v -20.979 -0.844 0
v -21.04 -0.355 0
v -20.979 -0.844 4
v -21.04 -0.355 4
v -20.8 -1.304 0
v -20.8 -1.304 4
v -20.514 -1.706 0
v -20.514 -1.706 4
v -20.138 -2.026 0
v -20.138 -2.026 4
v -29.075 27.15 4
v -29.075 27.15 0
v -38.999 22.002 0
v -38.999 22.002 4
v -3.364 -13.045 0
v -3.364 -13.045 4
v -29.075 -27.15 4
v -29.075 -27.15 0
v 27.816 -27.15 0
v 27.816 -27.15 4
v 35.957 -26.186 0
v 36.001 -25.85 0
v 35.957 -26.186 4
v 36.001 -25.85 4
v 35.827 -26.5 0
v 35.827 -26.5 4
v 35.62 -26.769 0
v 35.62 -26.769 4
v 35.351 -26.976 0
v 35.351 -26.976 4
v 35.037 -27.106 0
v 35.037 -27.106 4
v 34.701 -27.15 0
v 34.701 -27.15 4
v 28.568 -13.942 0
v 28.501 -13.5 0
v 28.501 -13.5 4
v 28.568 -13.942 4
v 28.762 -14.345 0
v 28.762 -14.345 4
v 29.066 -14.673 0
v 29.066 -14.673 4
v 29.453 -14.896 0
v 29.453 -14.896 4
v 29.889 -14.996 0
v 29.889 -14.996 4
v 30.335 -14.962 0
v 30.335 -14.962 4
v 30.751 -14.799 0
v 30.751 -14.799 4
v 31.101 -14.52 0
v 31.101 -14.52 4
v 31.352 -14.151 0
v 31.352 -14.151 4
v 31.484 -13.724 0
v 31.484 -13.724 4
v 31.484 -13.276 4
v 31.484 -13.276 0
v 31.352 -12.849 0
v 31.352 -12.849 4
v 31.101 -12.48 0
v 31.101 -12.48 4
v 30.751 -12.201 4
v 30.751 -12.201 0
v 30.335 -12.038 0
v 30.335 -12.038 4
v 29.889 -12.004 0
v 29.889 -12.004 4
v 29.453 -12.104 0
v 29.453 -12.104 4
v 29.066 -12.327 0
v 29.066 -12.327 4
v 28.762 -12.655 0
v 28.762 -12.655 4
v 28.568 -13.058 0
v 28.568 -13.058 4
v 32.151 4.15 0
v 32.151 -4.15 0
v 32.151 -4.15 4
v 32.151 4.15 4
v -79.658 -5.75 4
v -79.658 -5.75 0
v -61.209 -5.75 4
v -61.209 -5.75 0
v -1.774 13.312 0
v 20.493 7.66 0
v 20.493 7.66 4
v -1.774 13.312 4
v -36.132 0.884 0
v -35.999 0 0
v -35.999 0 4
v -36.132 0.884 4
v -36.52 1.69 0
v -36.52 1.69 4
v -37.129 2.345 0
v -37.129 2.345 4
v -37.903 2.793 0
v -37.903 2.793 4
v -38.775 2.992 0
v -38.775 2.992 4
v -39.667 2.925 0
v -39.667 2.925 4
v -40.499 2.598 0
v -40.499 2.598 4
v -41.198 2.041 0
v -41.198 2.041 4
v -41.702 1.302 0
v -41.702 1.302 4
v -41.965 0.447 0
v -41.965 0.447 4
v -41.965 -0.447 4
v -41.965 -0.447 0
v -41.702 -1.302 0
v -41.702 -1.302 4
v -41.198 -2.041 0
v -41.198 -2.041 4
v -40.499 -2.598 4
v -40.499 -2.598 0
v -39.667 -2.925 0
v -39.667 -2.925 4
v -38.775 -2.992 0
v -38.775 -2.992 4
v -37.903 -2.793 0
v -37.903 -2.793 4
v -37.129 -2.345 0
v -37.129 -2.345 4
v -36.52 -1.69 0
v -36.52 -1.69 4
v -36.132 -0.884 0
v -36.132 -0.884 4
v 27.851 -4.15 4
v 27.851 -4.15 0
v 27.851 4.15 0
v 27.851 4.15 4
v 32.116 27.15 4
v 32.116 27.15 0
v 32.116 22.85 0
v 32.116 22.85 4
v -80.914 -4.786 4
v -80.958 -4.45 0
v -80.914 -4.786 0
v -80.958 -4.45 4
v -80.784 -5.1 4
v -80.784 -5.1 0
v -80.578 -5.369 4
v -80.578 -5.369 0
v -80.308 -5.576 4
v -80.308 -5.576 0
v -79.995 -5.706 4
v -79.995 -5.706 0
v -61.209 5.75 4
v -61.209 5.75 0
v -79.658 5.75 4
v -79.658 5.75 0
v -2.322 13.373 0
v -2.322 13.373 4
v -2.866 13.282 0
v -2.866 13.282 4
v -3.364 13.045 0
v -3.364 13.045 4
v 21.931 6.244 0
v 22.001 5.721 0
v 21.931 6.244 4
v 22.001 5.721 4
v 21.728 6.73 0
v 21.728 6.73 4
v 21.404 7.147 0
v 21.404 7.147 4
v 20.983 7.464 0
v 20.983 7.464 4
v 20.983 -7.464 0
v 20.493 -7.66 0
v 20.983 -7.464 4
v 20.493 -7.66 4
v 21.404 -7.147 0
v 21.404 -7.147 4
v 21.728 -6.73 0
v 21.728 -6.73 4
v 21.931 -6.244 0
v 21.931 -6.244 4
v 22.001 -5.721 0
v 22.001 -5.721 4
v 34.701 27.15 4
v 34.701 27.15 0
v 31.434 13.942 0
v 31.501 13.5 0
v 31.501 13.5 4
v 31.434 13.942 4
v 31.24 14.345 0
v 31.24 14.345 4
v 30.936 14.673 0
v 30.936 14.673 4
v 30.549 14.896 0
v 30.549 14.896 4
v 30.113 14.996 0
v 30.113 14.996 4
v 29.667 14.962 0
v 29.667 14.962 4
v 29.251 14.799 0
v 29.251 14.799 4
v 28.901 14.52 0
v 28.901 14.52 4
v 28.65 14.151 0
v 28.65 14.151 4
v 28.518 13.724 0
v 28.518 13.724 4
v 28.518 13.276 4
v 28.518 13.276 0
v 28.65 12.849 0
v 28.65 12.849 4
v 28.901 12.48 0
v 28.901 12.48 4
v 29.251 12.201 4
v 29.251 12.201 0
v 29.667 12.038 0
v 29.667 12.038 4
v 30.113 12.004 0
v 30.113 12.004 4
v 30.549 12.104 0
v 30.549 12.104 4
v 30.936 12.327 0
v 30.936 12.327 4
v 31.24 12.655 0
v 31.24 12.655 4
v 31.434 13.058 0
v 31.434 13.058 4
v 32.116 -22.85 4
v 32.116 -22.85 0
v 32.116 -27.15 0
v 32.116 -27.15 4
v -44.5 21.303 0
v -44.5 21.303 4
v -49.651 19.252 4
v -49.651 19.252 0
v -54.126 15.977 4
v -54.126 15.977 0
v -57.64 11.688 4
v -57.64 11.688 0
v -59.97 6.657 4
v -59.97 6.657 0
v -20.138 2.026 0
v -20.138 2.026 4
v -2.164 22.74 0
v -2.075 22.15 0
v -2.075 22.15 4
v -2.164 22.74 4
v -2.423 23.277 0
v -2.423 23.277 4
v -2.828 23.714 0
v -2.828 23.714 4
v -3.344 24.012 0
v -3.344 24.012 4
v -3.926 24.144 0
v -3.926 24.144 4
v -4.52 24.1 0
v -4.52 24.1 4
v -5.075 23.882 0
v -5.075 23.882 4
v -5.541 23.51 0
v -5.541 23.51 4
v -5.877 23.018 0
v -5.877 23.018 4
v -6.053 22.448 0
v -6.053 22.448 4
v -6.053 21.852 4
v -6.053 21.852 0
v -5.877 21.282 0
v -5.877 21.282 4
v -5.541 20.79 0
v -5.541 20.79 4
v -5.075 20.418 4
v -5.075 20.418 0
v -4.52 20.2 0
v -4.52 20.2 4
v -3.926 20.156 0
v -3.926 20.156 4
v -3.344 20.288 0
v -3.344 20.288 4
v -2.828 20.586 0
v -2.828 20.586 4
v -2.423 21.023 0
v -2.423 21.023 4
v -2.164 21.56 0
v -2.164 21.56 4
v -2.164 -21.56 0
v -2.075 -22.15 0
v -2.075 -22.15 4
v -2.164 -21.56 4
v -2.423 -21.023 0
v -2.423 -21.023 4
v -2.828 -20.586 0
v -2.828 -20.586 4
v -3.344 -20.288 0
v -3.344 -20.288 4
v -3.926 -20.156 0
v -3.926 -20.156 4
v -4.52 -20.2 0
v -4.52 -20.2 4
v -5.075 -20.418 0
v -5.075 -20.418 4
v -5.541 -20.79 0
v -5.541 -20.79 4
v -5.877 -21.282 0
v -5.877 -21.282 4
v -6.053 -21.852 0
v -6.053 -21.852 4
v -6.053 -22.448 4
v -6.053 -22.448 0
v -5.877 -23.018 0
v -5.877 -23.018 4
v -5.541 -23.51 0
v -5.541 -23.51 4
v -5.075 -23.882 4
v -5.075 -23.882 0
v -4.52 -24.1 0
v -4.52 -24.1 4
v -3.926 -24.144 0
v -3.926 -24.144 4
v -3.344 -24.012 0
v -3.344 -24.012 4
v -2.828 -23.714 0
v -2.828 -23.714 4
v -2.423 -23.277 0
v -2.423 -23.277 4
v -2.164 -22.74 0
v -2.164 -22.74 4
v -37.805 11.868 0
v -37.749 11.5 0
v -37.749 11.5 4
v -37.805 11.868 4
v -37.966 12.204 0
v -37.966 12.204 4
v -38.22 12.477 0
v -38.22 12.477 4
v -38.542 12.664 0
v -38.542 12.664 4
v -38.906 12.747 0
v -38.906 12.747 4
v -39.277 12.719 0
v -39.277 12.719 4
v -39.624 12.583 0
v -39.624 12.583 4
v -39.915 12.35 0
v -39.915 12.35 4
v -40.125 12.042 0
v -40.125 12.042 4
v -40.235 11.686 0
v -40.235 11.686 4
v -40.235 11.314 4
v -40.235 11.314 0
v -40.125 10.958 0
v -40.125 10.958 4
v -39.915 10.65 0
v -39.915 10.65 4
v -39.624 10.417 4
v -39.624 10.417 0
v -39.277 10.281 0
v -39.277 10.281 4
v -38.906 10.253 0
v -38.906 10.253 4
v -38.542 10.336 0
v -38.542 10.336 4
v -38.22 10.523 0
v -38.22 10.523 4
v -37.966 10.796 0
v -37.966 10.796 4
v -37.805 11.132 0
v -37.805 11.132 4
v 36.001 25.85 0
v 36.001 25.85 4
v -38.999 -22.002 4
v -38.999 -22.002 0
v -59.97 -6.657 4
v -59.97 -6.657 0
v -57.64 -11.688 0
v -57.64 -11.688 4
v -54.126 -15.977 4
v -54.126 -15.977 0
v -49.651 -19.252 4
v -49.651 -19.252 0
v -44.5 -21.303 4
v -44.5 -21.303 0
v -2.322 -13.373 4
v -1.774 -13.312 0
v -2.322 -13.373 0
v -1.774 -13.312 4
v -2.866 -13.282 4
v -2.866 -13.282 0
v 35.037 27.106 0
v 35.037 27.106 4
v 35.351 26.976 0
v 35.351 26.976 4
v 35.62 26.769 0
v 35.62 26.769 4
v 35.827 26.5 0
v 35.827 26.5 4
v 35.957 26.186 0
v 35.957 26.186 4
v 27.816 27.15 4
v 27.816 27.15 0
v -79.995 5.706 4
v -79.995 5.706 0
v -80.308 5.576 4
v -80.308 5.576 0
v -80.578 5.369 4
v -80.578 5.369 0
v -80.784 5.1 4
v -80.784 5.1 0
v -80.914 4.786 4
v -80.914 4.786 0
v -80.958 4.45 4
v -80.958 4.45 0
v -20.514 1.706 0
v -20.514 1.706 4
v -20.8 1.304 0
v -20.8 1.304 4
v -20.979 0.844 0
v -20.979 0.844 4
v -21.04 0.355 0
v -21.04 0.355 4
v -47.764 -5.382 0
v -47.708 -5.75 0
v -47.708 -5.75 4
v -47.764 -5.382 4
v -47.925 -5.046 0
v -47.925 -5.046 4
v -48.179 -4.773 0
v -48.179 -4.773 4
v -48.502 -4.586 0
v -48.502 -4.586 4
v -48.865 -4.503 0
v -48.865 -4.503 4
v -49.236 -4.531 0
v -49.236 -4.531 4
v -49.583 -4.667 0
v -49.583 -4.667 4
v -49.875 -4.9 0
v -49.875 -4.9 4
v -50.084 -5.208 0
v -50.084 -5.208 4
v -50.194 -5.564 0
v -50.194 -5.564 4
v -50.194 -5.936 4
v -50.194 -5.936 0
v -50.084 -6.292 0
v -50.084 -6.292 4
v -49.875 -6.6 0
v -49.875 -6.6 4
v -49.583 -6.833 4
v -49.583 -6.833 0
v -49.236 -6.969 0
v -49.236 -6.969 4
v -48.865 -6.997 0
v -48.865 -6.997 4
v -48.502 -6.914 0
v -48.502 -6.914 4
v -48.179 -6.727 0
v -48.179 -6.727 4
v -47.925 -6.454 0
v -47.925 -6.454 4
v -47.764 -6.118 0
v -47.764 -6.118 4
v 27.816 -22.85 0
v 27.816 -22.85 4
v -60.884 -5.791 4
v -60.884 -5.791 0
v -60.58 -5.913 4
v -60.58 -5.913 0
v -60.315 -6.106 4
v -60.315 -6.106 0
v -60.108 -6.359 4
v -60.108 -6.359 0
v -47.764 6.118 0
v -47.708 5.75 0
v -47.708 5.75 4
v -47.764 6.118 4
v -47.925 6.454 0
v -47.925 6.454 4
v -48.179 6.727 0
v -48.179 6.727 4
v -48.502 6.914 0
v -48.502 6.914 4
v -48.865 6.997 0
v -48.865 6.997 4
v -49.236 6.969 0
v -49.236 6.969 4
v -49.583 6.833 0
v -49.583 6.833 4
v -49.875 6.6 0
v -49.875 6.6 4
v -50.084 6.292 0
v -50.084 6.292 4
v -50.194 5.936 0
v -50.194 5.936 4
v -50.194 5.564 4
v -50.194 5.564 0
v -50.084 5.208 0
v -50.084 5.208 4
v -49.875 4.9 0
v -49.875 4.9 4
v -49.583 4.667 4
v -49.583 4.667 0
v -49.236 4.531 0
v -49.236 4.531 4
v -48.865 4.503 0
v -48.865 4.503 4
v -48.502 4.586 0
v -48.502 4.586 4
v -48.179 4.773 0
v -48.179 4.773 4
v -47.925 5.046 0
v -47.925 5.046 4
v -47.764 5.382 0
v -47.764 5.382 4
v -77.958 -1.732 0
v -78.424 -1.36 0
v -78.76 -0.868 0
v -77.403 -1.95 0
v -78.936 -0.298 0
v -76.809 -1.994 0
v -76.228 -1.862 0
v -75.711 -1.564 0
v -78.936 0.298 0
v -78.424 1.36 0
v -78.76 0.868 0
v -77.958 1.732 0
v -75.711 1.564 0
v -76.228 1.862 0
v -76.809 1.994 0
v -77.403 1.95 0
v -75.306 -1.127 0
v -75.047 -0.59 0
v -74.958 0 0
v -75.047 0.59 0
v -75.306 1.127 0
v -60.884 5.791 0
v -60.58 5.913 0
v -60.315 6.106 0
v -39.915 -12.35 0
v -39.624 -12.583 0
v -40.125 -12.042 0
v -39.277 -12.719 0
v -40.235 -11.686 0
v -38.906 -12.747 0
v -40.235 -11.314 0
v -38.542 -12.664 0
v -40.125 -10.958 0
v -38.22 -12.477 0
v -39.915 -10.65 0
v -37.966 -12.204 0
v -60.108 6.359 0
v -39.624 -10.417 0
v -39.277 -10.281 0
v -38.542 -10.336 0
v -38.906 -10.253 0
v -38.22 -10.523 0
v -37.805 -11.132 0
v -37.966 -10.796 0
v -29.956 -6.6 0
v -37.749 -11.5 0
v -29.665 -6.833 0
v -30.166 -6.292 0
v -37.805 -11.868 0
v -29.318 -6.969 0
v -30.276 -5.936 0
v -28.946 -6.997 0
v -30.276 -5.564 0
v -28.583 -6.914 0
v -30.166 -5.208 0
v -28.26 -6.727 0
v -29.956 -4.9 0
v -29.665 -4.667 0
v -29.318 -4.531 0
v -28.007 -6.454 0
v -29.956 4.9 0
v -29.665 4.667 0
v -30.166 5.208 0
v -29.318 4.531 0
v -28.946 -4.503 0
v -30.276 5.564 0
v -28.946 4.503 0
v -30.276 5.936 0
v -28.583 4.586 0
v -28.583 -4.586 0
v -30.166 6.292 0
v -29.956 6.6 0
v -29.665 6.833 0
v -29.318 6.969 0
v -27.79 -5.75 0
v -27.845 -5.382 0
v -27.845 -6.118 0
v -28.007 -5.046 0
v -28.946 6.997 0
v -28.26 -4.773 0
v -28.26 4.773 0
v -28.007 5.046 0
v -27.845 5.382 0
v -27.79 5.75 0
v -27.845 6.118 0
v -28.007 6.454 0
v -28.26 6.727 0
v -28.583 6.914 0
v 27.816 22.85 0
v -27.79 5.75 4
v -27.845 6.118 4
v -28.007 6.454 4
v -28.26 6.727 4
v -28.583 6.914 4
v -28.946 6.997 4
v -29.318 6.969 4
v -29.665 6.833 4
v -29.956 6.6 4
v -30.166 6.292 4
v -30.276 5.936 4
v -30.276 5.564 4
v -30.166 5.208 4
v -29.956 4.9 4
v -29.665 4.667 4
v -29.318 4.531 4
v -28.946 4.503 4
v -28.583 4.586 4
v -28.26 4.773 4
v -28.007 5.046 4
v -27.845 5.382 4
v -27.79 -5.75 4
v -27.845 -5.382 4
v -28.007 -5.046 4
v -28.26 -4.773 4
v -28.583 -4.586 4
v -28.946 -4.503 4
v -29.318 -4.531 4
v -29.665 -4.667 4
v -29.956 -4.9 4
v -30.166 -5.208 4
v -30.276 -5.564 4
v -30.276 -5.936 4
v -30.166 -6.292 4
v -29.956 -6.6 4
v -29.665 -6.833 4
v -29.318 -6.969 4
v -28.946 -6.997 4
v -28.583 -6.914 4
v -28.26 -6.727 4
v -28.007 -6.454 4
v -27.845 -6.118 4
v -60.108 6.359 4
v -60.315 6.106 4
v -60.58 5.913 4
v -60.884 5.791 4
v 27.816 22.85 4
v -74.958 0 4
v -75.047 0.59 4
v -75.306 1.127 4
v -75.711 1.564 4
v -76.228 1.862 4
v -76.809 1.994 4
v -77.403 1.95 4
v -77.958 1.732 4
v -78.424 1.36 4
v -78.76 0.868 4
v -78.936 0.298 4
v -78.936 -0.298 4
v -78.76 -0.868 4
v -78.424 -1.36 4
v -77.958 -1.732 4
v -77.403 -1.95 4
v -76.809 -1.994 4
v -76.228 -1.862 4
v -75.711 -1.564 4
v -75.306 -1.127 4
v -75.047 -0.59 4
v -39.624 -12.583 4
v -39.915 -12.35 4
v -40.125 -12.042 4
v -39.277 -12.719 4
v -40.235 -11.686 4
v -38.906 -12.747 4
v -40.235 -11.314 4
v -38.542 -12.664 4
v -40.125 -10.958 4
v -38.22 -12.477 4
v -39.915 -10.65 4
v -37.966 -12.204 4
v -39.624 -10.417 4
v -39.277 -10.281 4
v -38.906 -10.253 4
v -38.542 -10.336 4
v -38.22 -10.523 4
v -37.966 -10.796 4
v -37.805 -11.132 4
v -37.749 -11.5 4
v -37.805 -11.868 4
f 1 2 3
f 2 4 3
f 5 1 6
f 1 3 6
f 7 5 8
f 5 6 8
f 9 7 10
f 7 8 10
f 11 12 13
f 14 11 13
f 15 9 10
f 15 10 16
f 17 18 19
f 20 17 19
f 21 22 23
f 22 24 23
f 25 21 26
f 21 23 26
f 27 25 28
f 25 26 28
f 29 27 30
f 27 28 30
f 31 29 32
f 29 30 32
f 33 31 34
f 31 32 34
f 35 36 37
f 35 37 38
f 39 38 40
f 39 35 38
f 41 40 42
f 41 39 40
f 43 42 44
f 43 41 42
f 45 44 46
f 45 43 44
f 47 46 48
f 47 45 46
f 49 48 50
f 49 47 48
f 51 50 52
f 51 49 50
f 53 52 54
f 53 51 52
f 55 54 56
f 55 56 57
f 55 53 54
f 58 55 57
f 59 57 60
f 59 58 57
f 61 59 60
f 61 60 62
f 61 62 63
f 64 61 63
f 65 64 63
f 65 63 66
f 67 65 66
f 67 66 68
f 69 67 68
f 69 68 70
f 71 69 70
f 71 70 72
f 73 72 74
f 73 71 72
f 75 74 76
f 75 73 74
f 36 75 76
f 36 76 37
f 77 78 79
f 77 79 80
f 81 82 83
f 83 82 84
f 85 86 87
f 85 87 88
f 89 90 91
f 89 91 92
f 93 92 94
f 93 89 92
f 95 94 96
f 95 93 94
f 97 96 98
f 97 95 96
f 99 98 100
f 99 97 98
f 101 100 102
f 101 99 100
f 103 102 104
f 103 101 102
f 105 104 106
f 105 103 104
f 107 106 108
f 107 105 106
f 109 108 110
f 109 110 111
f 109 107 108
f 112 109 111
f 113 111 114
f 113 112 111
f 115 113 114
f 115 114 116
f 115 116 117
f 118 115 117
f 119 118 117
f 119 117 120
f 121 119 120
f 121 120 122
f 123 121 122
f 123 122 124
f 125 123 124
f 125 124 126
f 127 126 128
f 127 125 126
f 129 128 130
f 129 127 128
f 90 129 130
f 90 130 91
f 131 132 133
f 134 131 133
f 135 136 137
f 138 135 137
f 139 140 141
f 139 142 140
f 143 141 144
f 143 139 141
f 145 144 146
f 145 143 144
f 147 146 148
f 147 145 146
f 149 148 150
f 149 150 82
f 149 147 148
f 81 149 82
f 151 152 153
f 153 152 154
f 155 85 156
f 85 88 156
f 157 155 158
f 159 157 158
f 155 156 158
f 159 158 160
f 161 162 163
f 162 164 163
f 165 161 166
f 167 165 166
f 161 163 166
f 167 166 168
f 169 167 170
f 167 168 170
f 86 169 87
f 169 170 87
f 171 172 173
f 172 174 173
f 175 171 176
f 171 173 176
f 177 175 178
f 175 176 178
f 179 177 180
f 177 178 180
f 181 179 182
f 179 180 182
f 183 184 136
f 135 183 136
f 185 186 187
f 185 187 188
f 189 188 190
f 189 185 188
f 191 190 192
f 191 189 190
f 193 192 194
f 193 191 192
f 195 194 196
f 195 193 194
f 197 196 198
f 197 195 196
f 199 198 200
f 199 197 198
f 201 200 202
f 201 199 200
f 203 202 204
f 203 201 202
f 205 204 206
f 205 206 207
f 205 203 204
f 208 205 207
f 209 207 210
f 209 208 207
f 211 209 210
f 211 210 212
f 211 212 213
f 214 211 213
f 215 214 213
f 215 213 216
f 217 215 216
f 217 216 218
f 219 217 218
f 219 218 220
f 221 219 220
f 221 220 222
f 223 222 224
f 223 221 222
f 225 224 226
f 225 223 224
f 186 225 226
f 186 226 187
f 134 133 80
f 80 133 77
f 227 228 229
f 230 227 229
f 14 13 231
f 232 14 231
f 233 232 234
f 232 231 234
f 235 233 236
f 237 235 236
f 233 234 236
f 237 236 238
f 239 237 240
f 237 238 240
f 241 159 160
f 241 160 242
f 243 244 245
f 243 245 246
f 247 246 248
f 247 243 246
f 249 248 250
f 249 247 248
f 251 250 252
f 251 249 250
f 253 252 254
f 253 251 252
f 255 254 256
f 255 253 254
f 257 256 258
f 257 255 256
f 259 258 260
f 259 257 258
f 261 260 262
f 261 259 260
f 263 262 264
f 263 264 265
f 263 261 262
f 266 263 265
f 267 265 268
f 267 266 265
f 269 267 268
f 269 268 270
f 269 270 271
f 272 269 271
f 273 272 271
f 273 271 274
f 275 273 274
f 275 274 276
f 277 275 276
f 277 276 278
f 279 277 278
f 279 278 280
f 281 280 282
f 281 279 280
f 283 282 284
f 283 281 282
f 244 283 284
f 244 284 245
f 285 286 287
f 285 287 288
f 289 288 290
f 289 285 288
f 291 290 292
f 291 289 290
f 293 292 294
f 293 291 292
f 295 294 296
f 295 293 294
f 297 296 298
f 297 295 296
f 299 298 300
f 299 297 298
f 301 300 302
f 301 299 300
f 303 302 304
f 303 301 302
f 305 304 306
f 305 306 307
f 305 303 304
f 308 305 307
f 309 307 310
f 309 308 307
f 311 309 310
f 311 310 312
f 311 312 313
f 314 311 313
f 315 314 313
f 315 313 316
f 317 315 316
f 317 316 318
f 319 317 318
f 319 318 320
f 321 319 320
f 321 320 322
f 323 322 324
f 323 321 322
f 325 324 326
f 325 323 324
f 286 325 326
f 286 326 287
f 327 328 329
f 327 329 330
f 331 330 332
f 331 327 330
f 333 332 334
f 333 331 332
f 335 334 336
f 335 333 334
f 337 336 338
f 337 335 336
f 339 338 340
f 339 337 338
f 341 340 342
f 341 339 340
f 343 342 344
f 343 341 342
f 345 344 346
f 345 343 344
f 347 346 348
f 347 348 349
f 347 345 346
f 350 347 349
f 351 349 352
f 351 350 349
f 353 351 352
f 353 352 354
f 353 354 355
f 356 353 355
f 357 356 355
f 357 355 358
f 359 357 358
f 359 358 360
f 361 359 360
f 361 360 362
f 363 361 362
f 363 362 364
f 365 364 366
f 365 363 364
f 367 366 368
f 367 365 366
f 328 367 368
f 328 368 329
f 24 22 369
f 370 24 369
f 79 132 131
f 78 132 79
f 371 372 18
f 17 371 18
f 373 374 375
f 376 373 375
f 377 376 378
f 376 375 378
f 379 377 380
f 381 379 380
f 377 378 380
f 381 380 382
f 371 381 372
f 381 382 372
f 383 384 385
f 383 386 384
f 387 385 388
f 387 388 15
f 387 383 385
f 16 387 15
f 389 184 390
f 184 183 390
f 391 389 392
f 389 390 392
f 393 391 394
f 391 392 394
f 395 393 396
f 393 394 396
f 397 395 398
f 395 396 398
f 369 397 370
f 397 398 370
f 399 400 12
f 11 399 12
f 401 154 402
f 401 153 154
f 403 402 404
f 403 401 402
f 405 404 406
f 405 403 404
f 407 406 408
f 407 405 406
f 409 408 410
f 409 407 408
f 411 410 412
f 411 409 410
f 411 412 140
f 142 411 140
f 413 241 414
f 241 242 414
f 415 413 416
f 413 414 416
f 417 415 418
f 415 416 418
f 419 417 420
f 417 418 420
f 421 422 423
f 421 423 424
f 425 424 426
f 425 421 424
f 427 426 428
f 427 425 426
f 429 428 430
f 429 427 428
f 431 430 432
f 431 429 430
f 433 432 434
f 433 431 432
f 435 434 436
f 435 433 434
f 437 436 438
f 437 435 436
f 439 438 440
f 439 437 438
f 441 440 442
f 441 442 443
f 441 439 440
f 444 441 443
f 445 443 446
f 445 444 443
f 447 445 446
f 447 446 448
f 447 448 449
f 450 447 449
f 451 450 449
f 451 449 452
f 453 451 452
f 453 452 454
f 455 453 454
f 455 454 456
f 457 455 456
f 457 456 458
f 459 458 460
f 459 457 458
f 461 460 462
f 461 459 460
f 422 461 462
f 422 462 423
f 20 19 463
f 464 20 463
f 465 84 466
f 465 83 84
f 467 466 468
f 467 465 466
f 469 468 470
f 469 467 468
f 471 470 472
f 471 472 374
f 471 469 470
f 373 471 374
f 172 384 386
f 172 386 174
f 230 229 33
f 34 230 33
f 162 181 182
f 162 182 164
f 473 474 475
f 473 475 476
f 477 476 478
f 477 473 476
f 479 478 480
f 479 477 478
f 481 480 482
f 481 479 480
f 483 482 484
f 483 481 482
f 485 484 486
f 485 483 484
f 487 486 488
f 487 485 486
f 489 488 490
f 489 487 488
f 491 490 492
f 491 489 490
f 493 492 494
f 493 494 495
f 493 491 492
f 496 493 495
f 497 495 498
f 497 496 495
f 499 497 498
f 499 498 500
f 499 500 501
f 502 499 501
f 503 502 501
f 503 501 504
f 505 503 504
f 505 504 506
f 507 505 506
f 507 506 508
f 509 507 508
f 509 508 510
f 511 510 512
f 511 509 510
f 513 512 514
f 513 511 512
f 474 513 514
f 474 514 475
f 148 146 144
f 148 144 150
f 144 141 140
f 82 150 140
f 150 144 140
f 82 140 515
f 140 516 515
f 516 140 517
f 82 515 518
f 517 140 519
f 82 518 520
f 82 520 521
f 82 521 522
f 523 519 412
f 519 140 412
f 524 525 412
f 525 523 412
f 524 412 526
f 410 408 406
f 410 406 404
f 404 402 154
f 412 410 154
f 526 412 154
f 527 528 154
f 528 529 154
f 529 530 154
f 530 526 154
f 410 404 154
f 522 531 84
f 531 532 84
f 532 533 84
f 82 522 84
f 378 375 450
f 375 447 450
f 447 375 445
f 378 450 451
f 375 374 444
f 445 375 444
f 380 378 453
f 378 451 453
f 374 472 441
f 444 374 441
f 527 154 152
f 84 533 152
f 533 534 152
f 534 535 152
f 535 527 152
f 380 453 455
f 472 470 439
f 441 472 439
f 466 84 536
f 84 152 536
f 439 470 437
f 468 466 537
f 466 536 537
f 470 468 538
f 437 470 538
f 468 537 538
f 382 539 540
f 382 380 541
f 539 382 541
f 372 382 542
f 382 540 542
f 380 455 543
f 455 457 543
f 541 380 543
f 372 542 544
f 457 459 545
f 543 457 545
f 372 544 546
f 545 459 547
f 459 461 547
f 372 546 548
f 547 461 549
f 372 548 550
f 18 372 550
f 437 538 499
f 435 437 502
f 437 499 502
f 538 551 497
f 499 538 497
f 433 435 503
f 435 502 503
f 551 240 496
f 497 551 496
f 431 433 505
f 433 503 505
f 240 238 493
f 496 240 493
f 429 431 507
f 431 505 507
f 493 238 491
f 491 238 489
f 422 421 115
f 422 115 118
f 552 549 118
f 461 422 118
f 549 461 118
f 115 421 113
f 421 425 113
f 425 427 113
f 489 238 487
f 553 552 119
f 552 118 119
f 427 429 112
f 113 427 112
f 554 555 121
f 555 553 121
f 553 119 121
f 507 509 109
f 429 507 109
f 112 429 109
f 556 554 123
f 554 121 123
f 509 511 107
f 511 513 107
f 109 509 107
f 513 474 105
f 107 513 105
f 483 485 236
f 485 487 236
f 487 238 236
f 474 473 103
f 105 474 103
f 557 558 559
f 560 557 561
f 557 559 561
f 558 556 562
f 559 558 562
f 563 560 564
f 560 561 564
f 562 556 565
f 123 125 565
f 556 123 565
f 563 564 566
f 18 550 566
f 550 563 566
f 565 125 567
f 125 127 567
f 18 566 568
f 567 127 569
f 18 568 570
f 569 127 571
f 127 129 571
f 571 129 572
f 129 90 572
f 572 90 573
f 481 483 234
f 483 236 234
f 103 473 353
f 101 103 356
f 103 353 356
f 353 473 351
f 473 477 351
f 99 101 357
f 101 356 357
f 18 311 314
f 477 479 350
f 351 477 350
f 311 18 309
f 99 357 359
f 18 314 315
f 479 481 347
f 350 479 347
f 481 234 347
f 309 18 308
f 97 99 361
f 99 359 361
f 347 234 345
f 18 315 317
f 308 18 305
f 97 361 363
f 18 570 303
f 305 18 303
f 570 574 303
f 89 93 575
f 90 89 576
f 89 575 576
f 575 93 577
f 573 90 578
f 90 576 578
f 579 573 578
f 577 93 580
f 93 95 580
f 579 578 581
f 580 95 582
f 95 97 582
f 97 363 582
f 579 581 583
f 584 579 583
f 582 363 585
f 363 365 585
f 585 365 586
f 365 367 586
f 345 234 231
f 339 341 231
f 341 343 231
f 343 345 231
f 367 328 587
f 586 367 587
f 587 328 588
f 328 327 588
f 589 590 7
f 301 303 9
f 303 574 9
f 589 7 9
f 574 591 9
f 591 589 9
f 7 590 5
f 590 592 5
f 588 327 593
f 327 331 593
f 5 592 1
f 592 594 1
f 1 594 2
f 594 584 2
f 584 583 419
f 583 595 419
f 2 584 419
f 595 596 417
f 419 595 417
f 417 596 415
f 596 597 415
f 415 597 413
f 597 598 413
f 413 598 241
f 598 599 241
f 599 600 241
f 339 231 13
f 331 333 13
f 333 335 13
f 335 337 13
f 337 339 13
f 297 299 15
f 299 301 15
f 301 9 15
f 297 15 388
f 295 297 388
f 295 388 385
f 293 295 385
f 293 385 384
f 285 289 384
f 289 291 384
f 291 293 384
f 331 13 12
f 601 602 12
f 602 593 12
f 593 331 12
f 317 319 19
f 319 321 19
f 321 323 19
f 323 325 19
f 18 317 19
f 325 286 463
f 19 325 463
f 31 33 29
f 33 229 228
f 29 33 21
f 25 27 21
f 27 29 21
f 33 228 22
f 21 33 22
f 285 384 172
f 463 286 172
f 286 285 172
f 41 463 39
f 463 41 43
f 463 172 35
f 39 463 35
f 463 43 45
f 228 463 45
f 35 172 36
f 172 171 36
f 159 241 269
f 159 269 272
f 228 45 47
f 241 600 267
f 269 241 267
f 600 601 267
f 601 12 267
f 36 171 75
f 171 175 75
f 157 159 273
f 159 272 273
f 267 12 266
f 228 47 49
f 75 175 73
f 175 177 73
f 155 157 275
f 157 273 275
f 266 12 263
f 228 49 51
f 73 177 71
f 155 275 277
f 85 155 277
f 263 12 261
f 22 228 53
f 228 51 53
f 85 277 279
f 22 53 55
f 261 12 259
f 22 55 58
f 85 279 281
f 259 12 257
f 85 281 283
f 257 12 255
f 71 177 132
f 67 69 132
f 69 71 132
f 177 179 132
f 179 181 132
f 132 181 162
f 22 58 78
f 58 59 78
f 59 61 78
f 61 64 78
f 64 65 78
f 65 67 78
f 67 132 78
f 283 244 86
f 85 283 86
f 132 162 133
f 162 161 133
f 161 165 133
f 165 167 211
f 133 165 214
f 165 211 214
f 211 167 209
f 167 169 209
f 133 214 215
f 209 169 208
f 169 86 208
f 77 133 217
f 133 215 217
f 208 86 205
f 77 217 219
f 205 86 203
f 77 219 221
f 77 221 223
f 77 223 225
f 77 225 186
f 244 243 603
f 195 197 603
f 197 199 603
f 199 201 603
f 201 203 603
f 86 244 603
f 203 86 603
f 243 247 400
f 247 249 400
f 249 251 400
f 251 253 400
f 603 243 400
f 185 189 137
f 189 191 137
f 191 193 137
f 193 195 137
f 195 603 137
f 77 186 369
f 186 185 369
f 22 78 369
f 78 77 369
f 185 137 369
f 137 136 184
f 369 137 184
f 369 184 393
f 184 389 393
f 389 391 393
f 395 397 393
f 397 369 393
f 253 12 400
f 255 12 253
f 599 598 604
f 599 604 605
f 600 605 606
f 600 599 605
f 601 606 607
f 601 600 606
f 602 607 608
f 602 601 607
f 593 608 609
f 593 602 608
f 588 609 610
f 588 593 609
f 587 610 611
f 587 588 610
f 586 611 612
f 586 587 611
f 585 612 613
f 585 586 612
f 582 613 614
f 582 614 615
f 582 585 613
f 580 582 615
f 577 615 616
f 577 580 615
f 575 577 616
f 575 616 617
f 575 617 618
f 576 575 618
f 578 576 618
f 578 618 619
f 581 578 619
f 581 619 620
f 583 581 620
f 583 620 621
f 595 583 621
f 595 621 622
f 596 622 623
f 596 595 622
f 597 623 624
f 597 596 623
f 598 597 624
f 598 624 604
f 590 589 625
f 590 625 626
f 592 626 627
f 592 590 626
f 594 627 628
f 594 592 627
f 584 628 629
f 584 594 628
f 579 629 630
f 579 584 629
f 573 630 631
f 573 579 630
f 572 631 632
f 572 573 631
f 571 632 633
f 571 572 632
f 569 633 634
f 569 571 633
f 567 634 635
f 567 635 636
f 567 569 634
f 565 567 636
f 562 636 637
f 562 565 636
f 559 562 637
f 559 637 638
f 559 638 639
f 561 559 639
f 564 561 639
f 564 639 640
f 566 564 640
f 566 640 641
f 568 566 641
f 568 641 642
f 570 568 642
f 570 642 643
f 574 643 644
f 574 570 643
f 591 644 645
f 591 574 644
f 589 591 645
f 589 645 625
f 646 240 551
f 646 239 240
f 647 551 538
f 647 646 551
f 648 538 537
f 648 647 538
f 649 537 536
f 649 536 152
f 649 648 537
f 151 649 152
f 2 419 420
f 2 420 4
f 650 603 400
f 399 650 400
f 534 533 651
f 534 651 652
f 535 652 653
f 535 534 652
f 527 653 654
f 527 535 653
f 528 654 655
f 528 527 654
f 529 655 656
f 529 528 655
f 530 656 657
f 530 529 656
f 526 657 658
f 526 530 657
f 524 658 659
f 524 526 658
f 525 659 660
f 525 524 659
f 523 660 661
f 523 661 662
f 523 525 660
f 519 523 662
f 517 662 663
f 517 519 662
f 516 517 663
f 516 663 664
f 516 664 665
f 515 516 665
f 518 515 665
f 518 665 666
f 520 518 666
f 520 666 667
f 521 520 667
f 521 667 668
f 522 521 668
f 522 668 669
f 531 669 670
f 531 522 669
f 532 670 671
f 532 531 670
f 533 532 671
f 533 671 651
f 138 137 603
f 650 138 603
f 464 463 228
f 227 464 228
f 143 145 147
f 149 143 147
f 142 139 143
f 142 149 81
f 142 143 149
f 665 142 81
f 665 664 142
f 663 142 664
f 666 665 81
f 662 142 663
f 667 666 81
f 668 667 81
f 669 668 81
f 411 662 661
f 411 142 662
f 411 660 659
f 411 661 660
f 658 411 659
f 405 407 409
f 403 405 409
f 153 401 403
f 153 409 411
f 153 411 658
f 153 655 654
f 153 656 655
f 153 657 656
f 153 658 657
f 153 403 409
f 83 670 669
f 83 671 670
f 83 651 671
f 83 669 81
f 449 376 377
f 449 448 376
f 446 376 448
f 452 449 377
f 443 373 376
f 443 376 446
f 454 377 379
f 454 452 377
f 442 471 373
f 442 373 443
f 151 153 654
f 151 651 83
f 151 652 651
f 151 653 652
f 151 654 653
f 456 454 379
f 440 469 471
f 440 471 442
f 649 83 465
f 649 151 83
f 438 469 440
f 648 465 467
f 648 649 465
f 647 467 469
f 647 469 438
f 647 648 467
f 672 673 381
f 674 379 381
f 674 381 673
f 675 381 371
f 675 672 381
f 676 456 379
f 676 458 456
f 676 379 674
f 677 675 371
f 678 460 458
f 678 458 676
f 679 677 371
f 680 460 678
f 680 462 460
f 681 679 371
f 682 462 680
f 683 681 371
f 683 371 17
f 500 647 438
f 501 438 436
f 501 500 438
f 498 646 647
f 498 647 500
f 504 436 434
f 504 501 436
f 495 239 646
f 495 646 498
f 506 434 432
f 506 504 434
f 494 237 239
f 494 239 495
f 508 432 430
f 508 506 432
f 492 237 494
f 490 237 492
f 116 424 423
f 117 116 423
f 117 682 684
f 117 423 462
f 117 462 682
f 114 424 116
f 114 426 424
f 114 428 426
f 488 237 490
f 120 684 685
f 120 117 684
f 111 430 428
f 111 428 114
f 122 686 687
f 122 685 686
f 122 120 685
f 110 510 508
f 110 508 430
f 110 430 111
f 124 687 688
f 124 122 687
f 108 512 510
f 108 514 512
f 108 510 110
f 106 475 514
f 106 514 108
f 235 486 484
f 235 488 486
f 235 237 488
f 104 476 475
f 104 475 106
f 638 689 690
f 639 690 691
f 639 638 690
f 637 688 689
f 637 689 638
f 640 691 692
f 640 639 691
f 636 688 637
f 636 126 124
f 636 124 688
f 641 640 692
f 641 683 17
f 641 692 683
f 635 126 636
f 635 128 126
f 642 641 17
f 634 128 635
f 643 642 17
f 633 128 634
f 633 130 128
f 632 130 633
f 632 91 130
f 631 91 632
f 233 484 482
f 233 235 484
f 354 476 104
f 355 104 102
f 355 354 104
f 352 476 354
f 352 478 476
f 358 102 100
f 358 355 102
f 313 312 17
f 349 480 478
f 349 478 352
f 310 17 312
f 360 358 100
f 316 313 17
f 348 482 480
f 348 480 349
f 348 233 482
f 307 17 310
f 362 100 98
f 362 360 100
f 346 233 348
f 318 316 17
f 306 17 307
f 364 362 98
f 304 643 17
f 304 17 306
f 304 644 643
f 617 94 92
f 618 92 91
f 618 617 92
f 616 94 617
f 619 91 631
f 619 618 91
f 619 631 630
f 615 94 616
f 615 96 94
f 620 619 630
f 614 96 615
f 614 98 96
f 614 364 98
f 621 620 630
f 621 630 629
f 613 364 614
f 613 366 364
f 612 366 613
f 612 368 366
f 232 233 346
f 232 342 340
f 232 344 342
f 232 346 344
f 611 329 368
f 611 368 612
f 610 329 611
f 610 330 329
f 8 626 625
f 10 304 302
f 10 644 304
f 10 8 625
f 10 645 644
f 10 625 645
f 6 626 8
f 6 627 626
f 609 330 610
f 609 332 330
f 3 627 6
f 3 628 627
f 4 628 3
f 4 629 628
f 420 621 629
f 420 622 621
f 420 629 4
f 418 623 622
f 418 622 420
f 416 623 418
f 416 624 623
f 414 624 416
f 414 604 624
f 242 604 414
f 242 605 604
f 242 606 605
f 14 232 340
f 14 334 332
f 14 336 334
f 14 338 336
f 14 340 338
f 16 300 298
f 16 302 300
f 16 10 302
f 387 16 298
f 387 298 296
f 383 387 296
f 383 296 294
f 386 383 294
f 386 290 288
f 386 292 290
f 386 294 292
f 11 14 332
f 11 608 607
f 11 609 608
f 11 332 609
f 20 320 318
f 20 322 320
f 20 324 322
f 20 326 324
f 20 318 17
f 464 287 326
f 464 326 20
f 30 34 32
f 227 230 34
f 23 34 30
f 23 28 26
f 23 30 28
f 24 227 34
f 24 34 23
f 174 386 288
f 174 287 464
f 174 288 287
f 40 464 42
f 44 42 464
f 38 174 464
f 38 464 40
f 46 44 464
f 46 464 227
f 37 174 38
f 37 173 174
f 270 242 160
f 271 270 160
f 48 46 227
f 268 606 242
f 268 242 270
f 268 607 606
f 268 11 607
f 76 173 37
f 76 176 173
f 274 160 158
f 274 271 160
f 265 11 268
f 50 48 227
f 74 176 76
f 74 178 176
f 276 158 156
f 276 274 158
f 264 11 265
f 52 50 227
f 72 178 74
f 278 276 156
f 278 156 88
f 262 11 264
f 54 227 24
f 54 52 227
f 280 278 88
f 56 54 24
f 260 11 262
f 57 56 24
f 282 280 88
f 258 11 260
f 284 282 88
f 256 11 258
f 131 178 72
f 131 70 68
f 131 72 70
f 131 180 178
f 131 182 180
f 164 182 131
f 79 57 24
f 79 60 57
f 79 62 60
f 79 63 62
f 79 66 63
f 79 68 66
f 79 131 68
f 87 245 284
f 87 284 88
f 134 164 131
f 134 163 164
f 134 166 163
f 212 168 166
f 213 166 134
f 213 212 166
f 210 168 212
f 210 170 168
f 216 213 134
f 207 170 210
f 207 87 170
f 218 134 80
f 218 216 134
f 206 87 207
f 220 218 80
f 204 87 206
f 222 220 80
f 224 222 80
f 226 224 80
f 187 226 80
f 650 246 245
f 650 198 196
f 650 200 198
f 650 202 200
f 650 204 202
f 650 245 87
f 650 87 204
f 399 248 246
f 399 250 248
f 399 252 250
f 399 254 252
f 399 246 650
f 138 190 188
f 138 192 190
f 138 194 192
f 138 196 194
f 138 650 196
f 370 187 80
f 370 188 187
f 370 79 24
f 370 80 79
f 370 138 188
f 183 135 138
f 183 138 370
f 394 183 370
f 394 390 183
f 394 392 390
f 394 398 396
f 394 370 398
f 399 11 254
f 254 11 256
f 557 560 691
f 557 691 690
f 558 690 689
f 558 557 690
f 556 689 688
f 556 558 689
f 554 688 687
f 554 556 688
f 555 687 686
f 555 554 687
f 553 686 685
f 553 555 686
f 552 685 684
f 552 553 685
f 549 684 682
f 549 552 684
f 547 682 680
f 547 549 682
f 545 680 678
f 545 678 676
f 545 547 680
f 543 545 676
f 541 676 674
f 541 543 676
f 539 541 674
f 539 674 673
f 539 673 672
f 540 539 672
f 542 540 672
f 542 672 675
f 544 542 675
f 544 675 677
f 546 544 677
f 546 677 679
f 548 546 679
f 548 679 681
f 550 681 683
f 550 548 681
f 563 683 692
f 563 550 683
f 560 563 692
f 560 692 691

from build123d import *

# Parameters (mm, degrees)
SKETCH_1_R      = 1.5
SKETCH_1_R_2    = 3
SKETCH_1_R_3    = 1.25
SKETCH_1_R_4    = 2
SKETCH_1_W      = 4.3
SKETCH_1_H      = 8.3
EXTRUDE_1_DEPTH = 4
FILLET_1_R      = 1.3
FILLET_2_R      = 2


with BuildPart() as part:
    # 草图1 → 凸台-拉伸1 (new body)
    with BuildSketch(Plane.XY):
        with BuildLine():
            Line((32.115707856, 27.15), (32.115707856, 22.85))
            Line((32.115707856, 22.85), (27.815707856, 22.85))
            Line((27.815707856, 22.85), (27.815707856, 27.15))
            Line((27.815707856, 27.15), (-29.075, 27.15))
            Line((-29.075, 27.15), (-38.998995168, 22.002009663))
            ThreePointArc((-38.998995168, 22.002009663), (-52.370174504, 17.472835843), (-60.236366221, 5.75))
            Line((-60.236366221, 5.75), (-80.958287312, 5.75))
            Line((-80.958287312, 5.75), (-80.958287312, -5.75))
            Line((-80.958287312, -5.75), (-60.236366221, -5.75))
            ThreePointArc((-60.236366221, -5.75), (-52.370174504, -17.472835843), (-38.998995168, -22.002009663))
            Line((-38.998995168, -22.002009663), (-29.075, -27.15))
            Line((-29.075, -27.15), (27.815707856, -27.15))
            Line((27.815707856, -27.15), (27.815707856, -22.85))
            Line((27.815707856, -22.85), (32.115707856, -22.85))
            Line((32.115707856, -22.85), (32.115707856, -27.15))
            Line((32.115707856, -27.15), (36.001004832, -27.15))
            Line((36.001004832, -27.15), (36.001004832, 27.15))
            Line((36.001004832, 27.15), (32.115707856, 27.15))
        make_face()
        with Locations((30.001004832, 13.5)):
            Circle(SKETCH_1_R, mode=Mode.SUBTRACT)
        with Locations(Location((30.001004832, -13.5, 0), (0, 0, 180))):
            Circle(SKETCH_1_R, mode=Mode.SUBTRACT)
        with Locations((-38.998995168, 0)):
            Circle(SKETCH_1_R_2, mode=Mode.SUBTRACT)
        with Locations((-38.998995168, -11.5)):
            Circle(SKETCH_1_R_3, mode=Mode.SUBTRACT)
        with Locations((-48.958287312, -5.75)):
            Circle(SKETCH_1_R_3, mode=Mode.SUBTRACT)
        with Locations((-48.958287312, 5.75)):
            Circle(SKETCH_1_R_3, mode=Mode.SUBTRACT)
        with Locations((-38.998995168, 11.5)):
            Circle(SKETCH_1_R_3, mode=Mode.SUBTRACT)
        with Locations((-29.039703025, 5.75)):
            Circle(SKETCH_1_R_3, mode=Mode.SUBTRACT)
        with Locations((-29.039703025, -5.75)):
            Circle(SKETCH_1_R_3, mode=Mode.SUBTRACT)
        with Locations((-4.075, -22.15)):
            Circle(SKETCH_1_R_4, mode=Mode.SUBTRACT)
        with Locations((-4.075, 22.15)):
            Circle(SKETCH_1_R_4, mode=Mode.SUBTRACT)
        with Locations((-76.958287312, 0)):
            Circle(SKETCH_1_R_4, mode=Mode.SUBTRACT)
        with Locations((30.001004832, 0)):
            Rectangle(SKETCH_1_W, SKETCH_1_H, mode=Mode.SUBTRACT)
        Polygon((-2.627787708, -13.528909152), (22.001004832, -7.277030256), (22.001004832, 7.277030256), (-2.627787708, 13.528909152), (-21.039703025, 1.433615613), (-21.039703025, -1.433615613), align=None, mode=Mode.SUBTRACT)
    extrude(amount=EXTRUDE_1_DEPTH)

    # 圆角1
    fillet_1_edges = [part.edges().sort_by_distance(p)[0] for p in [
        (-60.236366221, -5.75, 2),
        (-80.958287312, -5.75, 2),
        (-80.958287312, 5.75, 2),
        (-60.236366221, 5.75, 2),
        (36.001004832, 27.15, 2),
        (36.001004832, -27.15, 2),
    ]]
    fillet(fillet_1_edges, radius=FILLET_1_R)

    # 圆角2
    fillet_2_edges = [part.edges().sort_by_distance(p)[0] for p in [
        (-21.039703025, -1.433615613, 2),
        (-2.627787708, -13.528909152, 2),
        (22.001004832, -7.277030256, 2),
        (22.001004832, 7.277030256, 2),
        (-2.627787708, 13.528909152, 2),
        (-21.039703025, 1.433615613, 2),
    ]]
    fillet(fillet_2_edges, radius=FILLET_2_R)


solid = part.part
